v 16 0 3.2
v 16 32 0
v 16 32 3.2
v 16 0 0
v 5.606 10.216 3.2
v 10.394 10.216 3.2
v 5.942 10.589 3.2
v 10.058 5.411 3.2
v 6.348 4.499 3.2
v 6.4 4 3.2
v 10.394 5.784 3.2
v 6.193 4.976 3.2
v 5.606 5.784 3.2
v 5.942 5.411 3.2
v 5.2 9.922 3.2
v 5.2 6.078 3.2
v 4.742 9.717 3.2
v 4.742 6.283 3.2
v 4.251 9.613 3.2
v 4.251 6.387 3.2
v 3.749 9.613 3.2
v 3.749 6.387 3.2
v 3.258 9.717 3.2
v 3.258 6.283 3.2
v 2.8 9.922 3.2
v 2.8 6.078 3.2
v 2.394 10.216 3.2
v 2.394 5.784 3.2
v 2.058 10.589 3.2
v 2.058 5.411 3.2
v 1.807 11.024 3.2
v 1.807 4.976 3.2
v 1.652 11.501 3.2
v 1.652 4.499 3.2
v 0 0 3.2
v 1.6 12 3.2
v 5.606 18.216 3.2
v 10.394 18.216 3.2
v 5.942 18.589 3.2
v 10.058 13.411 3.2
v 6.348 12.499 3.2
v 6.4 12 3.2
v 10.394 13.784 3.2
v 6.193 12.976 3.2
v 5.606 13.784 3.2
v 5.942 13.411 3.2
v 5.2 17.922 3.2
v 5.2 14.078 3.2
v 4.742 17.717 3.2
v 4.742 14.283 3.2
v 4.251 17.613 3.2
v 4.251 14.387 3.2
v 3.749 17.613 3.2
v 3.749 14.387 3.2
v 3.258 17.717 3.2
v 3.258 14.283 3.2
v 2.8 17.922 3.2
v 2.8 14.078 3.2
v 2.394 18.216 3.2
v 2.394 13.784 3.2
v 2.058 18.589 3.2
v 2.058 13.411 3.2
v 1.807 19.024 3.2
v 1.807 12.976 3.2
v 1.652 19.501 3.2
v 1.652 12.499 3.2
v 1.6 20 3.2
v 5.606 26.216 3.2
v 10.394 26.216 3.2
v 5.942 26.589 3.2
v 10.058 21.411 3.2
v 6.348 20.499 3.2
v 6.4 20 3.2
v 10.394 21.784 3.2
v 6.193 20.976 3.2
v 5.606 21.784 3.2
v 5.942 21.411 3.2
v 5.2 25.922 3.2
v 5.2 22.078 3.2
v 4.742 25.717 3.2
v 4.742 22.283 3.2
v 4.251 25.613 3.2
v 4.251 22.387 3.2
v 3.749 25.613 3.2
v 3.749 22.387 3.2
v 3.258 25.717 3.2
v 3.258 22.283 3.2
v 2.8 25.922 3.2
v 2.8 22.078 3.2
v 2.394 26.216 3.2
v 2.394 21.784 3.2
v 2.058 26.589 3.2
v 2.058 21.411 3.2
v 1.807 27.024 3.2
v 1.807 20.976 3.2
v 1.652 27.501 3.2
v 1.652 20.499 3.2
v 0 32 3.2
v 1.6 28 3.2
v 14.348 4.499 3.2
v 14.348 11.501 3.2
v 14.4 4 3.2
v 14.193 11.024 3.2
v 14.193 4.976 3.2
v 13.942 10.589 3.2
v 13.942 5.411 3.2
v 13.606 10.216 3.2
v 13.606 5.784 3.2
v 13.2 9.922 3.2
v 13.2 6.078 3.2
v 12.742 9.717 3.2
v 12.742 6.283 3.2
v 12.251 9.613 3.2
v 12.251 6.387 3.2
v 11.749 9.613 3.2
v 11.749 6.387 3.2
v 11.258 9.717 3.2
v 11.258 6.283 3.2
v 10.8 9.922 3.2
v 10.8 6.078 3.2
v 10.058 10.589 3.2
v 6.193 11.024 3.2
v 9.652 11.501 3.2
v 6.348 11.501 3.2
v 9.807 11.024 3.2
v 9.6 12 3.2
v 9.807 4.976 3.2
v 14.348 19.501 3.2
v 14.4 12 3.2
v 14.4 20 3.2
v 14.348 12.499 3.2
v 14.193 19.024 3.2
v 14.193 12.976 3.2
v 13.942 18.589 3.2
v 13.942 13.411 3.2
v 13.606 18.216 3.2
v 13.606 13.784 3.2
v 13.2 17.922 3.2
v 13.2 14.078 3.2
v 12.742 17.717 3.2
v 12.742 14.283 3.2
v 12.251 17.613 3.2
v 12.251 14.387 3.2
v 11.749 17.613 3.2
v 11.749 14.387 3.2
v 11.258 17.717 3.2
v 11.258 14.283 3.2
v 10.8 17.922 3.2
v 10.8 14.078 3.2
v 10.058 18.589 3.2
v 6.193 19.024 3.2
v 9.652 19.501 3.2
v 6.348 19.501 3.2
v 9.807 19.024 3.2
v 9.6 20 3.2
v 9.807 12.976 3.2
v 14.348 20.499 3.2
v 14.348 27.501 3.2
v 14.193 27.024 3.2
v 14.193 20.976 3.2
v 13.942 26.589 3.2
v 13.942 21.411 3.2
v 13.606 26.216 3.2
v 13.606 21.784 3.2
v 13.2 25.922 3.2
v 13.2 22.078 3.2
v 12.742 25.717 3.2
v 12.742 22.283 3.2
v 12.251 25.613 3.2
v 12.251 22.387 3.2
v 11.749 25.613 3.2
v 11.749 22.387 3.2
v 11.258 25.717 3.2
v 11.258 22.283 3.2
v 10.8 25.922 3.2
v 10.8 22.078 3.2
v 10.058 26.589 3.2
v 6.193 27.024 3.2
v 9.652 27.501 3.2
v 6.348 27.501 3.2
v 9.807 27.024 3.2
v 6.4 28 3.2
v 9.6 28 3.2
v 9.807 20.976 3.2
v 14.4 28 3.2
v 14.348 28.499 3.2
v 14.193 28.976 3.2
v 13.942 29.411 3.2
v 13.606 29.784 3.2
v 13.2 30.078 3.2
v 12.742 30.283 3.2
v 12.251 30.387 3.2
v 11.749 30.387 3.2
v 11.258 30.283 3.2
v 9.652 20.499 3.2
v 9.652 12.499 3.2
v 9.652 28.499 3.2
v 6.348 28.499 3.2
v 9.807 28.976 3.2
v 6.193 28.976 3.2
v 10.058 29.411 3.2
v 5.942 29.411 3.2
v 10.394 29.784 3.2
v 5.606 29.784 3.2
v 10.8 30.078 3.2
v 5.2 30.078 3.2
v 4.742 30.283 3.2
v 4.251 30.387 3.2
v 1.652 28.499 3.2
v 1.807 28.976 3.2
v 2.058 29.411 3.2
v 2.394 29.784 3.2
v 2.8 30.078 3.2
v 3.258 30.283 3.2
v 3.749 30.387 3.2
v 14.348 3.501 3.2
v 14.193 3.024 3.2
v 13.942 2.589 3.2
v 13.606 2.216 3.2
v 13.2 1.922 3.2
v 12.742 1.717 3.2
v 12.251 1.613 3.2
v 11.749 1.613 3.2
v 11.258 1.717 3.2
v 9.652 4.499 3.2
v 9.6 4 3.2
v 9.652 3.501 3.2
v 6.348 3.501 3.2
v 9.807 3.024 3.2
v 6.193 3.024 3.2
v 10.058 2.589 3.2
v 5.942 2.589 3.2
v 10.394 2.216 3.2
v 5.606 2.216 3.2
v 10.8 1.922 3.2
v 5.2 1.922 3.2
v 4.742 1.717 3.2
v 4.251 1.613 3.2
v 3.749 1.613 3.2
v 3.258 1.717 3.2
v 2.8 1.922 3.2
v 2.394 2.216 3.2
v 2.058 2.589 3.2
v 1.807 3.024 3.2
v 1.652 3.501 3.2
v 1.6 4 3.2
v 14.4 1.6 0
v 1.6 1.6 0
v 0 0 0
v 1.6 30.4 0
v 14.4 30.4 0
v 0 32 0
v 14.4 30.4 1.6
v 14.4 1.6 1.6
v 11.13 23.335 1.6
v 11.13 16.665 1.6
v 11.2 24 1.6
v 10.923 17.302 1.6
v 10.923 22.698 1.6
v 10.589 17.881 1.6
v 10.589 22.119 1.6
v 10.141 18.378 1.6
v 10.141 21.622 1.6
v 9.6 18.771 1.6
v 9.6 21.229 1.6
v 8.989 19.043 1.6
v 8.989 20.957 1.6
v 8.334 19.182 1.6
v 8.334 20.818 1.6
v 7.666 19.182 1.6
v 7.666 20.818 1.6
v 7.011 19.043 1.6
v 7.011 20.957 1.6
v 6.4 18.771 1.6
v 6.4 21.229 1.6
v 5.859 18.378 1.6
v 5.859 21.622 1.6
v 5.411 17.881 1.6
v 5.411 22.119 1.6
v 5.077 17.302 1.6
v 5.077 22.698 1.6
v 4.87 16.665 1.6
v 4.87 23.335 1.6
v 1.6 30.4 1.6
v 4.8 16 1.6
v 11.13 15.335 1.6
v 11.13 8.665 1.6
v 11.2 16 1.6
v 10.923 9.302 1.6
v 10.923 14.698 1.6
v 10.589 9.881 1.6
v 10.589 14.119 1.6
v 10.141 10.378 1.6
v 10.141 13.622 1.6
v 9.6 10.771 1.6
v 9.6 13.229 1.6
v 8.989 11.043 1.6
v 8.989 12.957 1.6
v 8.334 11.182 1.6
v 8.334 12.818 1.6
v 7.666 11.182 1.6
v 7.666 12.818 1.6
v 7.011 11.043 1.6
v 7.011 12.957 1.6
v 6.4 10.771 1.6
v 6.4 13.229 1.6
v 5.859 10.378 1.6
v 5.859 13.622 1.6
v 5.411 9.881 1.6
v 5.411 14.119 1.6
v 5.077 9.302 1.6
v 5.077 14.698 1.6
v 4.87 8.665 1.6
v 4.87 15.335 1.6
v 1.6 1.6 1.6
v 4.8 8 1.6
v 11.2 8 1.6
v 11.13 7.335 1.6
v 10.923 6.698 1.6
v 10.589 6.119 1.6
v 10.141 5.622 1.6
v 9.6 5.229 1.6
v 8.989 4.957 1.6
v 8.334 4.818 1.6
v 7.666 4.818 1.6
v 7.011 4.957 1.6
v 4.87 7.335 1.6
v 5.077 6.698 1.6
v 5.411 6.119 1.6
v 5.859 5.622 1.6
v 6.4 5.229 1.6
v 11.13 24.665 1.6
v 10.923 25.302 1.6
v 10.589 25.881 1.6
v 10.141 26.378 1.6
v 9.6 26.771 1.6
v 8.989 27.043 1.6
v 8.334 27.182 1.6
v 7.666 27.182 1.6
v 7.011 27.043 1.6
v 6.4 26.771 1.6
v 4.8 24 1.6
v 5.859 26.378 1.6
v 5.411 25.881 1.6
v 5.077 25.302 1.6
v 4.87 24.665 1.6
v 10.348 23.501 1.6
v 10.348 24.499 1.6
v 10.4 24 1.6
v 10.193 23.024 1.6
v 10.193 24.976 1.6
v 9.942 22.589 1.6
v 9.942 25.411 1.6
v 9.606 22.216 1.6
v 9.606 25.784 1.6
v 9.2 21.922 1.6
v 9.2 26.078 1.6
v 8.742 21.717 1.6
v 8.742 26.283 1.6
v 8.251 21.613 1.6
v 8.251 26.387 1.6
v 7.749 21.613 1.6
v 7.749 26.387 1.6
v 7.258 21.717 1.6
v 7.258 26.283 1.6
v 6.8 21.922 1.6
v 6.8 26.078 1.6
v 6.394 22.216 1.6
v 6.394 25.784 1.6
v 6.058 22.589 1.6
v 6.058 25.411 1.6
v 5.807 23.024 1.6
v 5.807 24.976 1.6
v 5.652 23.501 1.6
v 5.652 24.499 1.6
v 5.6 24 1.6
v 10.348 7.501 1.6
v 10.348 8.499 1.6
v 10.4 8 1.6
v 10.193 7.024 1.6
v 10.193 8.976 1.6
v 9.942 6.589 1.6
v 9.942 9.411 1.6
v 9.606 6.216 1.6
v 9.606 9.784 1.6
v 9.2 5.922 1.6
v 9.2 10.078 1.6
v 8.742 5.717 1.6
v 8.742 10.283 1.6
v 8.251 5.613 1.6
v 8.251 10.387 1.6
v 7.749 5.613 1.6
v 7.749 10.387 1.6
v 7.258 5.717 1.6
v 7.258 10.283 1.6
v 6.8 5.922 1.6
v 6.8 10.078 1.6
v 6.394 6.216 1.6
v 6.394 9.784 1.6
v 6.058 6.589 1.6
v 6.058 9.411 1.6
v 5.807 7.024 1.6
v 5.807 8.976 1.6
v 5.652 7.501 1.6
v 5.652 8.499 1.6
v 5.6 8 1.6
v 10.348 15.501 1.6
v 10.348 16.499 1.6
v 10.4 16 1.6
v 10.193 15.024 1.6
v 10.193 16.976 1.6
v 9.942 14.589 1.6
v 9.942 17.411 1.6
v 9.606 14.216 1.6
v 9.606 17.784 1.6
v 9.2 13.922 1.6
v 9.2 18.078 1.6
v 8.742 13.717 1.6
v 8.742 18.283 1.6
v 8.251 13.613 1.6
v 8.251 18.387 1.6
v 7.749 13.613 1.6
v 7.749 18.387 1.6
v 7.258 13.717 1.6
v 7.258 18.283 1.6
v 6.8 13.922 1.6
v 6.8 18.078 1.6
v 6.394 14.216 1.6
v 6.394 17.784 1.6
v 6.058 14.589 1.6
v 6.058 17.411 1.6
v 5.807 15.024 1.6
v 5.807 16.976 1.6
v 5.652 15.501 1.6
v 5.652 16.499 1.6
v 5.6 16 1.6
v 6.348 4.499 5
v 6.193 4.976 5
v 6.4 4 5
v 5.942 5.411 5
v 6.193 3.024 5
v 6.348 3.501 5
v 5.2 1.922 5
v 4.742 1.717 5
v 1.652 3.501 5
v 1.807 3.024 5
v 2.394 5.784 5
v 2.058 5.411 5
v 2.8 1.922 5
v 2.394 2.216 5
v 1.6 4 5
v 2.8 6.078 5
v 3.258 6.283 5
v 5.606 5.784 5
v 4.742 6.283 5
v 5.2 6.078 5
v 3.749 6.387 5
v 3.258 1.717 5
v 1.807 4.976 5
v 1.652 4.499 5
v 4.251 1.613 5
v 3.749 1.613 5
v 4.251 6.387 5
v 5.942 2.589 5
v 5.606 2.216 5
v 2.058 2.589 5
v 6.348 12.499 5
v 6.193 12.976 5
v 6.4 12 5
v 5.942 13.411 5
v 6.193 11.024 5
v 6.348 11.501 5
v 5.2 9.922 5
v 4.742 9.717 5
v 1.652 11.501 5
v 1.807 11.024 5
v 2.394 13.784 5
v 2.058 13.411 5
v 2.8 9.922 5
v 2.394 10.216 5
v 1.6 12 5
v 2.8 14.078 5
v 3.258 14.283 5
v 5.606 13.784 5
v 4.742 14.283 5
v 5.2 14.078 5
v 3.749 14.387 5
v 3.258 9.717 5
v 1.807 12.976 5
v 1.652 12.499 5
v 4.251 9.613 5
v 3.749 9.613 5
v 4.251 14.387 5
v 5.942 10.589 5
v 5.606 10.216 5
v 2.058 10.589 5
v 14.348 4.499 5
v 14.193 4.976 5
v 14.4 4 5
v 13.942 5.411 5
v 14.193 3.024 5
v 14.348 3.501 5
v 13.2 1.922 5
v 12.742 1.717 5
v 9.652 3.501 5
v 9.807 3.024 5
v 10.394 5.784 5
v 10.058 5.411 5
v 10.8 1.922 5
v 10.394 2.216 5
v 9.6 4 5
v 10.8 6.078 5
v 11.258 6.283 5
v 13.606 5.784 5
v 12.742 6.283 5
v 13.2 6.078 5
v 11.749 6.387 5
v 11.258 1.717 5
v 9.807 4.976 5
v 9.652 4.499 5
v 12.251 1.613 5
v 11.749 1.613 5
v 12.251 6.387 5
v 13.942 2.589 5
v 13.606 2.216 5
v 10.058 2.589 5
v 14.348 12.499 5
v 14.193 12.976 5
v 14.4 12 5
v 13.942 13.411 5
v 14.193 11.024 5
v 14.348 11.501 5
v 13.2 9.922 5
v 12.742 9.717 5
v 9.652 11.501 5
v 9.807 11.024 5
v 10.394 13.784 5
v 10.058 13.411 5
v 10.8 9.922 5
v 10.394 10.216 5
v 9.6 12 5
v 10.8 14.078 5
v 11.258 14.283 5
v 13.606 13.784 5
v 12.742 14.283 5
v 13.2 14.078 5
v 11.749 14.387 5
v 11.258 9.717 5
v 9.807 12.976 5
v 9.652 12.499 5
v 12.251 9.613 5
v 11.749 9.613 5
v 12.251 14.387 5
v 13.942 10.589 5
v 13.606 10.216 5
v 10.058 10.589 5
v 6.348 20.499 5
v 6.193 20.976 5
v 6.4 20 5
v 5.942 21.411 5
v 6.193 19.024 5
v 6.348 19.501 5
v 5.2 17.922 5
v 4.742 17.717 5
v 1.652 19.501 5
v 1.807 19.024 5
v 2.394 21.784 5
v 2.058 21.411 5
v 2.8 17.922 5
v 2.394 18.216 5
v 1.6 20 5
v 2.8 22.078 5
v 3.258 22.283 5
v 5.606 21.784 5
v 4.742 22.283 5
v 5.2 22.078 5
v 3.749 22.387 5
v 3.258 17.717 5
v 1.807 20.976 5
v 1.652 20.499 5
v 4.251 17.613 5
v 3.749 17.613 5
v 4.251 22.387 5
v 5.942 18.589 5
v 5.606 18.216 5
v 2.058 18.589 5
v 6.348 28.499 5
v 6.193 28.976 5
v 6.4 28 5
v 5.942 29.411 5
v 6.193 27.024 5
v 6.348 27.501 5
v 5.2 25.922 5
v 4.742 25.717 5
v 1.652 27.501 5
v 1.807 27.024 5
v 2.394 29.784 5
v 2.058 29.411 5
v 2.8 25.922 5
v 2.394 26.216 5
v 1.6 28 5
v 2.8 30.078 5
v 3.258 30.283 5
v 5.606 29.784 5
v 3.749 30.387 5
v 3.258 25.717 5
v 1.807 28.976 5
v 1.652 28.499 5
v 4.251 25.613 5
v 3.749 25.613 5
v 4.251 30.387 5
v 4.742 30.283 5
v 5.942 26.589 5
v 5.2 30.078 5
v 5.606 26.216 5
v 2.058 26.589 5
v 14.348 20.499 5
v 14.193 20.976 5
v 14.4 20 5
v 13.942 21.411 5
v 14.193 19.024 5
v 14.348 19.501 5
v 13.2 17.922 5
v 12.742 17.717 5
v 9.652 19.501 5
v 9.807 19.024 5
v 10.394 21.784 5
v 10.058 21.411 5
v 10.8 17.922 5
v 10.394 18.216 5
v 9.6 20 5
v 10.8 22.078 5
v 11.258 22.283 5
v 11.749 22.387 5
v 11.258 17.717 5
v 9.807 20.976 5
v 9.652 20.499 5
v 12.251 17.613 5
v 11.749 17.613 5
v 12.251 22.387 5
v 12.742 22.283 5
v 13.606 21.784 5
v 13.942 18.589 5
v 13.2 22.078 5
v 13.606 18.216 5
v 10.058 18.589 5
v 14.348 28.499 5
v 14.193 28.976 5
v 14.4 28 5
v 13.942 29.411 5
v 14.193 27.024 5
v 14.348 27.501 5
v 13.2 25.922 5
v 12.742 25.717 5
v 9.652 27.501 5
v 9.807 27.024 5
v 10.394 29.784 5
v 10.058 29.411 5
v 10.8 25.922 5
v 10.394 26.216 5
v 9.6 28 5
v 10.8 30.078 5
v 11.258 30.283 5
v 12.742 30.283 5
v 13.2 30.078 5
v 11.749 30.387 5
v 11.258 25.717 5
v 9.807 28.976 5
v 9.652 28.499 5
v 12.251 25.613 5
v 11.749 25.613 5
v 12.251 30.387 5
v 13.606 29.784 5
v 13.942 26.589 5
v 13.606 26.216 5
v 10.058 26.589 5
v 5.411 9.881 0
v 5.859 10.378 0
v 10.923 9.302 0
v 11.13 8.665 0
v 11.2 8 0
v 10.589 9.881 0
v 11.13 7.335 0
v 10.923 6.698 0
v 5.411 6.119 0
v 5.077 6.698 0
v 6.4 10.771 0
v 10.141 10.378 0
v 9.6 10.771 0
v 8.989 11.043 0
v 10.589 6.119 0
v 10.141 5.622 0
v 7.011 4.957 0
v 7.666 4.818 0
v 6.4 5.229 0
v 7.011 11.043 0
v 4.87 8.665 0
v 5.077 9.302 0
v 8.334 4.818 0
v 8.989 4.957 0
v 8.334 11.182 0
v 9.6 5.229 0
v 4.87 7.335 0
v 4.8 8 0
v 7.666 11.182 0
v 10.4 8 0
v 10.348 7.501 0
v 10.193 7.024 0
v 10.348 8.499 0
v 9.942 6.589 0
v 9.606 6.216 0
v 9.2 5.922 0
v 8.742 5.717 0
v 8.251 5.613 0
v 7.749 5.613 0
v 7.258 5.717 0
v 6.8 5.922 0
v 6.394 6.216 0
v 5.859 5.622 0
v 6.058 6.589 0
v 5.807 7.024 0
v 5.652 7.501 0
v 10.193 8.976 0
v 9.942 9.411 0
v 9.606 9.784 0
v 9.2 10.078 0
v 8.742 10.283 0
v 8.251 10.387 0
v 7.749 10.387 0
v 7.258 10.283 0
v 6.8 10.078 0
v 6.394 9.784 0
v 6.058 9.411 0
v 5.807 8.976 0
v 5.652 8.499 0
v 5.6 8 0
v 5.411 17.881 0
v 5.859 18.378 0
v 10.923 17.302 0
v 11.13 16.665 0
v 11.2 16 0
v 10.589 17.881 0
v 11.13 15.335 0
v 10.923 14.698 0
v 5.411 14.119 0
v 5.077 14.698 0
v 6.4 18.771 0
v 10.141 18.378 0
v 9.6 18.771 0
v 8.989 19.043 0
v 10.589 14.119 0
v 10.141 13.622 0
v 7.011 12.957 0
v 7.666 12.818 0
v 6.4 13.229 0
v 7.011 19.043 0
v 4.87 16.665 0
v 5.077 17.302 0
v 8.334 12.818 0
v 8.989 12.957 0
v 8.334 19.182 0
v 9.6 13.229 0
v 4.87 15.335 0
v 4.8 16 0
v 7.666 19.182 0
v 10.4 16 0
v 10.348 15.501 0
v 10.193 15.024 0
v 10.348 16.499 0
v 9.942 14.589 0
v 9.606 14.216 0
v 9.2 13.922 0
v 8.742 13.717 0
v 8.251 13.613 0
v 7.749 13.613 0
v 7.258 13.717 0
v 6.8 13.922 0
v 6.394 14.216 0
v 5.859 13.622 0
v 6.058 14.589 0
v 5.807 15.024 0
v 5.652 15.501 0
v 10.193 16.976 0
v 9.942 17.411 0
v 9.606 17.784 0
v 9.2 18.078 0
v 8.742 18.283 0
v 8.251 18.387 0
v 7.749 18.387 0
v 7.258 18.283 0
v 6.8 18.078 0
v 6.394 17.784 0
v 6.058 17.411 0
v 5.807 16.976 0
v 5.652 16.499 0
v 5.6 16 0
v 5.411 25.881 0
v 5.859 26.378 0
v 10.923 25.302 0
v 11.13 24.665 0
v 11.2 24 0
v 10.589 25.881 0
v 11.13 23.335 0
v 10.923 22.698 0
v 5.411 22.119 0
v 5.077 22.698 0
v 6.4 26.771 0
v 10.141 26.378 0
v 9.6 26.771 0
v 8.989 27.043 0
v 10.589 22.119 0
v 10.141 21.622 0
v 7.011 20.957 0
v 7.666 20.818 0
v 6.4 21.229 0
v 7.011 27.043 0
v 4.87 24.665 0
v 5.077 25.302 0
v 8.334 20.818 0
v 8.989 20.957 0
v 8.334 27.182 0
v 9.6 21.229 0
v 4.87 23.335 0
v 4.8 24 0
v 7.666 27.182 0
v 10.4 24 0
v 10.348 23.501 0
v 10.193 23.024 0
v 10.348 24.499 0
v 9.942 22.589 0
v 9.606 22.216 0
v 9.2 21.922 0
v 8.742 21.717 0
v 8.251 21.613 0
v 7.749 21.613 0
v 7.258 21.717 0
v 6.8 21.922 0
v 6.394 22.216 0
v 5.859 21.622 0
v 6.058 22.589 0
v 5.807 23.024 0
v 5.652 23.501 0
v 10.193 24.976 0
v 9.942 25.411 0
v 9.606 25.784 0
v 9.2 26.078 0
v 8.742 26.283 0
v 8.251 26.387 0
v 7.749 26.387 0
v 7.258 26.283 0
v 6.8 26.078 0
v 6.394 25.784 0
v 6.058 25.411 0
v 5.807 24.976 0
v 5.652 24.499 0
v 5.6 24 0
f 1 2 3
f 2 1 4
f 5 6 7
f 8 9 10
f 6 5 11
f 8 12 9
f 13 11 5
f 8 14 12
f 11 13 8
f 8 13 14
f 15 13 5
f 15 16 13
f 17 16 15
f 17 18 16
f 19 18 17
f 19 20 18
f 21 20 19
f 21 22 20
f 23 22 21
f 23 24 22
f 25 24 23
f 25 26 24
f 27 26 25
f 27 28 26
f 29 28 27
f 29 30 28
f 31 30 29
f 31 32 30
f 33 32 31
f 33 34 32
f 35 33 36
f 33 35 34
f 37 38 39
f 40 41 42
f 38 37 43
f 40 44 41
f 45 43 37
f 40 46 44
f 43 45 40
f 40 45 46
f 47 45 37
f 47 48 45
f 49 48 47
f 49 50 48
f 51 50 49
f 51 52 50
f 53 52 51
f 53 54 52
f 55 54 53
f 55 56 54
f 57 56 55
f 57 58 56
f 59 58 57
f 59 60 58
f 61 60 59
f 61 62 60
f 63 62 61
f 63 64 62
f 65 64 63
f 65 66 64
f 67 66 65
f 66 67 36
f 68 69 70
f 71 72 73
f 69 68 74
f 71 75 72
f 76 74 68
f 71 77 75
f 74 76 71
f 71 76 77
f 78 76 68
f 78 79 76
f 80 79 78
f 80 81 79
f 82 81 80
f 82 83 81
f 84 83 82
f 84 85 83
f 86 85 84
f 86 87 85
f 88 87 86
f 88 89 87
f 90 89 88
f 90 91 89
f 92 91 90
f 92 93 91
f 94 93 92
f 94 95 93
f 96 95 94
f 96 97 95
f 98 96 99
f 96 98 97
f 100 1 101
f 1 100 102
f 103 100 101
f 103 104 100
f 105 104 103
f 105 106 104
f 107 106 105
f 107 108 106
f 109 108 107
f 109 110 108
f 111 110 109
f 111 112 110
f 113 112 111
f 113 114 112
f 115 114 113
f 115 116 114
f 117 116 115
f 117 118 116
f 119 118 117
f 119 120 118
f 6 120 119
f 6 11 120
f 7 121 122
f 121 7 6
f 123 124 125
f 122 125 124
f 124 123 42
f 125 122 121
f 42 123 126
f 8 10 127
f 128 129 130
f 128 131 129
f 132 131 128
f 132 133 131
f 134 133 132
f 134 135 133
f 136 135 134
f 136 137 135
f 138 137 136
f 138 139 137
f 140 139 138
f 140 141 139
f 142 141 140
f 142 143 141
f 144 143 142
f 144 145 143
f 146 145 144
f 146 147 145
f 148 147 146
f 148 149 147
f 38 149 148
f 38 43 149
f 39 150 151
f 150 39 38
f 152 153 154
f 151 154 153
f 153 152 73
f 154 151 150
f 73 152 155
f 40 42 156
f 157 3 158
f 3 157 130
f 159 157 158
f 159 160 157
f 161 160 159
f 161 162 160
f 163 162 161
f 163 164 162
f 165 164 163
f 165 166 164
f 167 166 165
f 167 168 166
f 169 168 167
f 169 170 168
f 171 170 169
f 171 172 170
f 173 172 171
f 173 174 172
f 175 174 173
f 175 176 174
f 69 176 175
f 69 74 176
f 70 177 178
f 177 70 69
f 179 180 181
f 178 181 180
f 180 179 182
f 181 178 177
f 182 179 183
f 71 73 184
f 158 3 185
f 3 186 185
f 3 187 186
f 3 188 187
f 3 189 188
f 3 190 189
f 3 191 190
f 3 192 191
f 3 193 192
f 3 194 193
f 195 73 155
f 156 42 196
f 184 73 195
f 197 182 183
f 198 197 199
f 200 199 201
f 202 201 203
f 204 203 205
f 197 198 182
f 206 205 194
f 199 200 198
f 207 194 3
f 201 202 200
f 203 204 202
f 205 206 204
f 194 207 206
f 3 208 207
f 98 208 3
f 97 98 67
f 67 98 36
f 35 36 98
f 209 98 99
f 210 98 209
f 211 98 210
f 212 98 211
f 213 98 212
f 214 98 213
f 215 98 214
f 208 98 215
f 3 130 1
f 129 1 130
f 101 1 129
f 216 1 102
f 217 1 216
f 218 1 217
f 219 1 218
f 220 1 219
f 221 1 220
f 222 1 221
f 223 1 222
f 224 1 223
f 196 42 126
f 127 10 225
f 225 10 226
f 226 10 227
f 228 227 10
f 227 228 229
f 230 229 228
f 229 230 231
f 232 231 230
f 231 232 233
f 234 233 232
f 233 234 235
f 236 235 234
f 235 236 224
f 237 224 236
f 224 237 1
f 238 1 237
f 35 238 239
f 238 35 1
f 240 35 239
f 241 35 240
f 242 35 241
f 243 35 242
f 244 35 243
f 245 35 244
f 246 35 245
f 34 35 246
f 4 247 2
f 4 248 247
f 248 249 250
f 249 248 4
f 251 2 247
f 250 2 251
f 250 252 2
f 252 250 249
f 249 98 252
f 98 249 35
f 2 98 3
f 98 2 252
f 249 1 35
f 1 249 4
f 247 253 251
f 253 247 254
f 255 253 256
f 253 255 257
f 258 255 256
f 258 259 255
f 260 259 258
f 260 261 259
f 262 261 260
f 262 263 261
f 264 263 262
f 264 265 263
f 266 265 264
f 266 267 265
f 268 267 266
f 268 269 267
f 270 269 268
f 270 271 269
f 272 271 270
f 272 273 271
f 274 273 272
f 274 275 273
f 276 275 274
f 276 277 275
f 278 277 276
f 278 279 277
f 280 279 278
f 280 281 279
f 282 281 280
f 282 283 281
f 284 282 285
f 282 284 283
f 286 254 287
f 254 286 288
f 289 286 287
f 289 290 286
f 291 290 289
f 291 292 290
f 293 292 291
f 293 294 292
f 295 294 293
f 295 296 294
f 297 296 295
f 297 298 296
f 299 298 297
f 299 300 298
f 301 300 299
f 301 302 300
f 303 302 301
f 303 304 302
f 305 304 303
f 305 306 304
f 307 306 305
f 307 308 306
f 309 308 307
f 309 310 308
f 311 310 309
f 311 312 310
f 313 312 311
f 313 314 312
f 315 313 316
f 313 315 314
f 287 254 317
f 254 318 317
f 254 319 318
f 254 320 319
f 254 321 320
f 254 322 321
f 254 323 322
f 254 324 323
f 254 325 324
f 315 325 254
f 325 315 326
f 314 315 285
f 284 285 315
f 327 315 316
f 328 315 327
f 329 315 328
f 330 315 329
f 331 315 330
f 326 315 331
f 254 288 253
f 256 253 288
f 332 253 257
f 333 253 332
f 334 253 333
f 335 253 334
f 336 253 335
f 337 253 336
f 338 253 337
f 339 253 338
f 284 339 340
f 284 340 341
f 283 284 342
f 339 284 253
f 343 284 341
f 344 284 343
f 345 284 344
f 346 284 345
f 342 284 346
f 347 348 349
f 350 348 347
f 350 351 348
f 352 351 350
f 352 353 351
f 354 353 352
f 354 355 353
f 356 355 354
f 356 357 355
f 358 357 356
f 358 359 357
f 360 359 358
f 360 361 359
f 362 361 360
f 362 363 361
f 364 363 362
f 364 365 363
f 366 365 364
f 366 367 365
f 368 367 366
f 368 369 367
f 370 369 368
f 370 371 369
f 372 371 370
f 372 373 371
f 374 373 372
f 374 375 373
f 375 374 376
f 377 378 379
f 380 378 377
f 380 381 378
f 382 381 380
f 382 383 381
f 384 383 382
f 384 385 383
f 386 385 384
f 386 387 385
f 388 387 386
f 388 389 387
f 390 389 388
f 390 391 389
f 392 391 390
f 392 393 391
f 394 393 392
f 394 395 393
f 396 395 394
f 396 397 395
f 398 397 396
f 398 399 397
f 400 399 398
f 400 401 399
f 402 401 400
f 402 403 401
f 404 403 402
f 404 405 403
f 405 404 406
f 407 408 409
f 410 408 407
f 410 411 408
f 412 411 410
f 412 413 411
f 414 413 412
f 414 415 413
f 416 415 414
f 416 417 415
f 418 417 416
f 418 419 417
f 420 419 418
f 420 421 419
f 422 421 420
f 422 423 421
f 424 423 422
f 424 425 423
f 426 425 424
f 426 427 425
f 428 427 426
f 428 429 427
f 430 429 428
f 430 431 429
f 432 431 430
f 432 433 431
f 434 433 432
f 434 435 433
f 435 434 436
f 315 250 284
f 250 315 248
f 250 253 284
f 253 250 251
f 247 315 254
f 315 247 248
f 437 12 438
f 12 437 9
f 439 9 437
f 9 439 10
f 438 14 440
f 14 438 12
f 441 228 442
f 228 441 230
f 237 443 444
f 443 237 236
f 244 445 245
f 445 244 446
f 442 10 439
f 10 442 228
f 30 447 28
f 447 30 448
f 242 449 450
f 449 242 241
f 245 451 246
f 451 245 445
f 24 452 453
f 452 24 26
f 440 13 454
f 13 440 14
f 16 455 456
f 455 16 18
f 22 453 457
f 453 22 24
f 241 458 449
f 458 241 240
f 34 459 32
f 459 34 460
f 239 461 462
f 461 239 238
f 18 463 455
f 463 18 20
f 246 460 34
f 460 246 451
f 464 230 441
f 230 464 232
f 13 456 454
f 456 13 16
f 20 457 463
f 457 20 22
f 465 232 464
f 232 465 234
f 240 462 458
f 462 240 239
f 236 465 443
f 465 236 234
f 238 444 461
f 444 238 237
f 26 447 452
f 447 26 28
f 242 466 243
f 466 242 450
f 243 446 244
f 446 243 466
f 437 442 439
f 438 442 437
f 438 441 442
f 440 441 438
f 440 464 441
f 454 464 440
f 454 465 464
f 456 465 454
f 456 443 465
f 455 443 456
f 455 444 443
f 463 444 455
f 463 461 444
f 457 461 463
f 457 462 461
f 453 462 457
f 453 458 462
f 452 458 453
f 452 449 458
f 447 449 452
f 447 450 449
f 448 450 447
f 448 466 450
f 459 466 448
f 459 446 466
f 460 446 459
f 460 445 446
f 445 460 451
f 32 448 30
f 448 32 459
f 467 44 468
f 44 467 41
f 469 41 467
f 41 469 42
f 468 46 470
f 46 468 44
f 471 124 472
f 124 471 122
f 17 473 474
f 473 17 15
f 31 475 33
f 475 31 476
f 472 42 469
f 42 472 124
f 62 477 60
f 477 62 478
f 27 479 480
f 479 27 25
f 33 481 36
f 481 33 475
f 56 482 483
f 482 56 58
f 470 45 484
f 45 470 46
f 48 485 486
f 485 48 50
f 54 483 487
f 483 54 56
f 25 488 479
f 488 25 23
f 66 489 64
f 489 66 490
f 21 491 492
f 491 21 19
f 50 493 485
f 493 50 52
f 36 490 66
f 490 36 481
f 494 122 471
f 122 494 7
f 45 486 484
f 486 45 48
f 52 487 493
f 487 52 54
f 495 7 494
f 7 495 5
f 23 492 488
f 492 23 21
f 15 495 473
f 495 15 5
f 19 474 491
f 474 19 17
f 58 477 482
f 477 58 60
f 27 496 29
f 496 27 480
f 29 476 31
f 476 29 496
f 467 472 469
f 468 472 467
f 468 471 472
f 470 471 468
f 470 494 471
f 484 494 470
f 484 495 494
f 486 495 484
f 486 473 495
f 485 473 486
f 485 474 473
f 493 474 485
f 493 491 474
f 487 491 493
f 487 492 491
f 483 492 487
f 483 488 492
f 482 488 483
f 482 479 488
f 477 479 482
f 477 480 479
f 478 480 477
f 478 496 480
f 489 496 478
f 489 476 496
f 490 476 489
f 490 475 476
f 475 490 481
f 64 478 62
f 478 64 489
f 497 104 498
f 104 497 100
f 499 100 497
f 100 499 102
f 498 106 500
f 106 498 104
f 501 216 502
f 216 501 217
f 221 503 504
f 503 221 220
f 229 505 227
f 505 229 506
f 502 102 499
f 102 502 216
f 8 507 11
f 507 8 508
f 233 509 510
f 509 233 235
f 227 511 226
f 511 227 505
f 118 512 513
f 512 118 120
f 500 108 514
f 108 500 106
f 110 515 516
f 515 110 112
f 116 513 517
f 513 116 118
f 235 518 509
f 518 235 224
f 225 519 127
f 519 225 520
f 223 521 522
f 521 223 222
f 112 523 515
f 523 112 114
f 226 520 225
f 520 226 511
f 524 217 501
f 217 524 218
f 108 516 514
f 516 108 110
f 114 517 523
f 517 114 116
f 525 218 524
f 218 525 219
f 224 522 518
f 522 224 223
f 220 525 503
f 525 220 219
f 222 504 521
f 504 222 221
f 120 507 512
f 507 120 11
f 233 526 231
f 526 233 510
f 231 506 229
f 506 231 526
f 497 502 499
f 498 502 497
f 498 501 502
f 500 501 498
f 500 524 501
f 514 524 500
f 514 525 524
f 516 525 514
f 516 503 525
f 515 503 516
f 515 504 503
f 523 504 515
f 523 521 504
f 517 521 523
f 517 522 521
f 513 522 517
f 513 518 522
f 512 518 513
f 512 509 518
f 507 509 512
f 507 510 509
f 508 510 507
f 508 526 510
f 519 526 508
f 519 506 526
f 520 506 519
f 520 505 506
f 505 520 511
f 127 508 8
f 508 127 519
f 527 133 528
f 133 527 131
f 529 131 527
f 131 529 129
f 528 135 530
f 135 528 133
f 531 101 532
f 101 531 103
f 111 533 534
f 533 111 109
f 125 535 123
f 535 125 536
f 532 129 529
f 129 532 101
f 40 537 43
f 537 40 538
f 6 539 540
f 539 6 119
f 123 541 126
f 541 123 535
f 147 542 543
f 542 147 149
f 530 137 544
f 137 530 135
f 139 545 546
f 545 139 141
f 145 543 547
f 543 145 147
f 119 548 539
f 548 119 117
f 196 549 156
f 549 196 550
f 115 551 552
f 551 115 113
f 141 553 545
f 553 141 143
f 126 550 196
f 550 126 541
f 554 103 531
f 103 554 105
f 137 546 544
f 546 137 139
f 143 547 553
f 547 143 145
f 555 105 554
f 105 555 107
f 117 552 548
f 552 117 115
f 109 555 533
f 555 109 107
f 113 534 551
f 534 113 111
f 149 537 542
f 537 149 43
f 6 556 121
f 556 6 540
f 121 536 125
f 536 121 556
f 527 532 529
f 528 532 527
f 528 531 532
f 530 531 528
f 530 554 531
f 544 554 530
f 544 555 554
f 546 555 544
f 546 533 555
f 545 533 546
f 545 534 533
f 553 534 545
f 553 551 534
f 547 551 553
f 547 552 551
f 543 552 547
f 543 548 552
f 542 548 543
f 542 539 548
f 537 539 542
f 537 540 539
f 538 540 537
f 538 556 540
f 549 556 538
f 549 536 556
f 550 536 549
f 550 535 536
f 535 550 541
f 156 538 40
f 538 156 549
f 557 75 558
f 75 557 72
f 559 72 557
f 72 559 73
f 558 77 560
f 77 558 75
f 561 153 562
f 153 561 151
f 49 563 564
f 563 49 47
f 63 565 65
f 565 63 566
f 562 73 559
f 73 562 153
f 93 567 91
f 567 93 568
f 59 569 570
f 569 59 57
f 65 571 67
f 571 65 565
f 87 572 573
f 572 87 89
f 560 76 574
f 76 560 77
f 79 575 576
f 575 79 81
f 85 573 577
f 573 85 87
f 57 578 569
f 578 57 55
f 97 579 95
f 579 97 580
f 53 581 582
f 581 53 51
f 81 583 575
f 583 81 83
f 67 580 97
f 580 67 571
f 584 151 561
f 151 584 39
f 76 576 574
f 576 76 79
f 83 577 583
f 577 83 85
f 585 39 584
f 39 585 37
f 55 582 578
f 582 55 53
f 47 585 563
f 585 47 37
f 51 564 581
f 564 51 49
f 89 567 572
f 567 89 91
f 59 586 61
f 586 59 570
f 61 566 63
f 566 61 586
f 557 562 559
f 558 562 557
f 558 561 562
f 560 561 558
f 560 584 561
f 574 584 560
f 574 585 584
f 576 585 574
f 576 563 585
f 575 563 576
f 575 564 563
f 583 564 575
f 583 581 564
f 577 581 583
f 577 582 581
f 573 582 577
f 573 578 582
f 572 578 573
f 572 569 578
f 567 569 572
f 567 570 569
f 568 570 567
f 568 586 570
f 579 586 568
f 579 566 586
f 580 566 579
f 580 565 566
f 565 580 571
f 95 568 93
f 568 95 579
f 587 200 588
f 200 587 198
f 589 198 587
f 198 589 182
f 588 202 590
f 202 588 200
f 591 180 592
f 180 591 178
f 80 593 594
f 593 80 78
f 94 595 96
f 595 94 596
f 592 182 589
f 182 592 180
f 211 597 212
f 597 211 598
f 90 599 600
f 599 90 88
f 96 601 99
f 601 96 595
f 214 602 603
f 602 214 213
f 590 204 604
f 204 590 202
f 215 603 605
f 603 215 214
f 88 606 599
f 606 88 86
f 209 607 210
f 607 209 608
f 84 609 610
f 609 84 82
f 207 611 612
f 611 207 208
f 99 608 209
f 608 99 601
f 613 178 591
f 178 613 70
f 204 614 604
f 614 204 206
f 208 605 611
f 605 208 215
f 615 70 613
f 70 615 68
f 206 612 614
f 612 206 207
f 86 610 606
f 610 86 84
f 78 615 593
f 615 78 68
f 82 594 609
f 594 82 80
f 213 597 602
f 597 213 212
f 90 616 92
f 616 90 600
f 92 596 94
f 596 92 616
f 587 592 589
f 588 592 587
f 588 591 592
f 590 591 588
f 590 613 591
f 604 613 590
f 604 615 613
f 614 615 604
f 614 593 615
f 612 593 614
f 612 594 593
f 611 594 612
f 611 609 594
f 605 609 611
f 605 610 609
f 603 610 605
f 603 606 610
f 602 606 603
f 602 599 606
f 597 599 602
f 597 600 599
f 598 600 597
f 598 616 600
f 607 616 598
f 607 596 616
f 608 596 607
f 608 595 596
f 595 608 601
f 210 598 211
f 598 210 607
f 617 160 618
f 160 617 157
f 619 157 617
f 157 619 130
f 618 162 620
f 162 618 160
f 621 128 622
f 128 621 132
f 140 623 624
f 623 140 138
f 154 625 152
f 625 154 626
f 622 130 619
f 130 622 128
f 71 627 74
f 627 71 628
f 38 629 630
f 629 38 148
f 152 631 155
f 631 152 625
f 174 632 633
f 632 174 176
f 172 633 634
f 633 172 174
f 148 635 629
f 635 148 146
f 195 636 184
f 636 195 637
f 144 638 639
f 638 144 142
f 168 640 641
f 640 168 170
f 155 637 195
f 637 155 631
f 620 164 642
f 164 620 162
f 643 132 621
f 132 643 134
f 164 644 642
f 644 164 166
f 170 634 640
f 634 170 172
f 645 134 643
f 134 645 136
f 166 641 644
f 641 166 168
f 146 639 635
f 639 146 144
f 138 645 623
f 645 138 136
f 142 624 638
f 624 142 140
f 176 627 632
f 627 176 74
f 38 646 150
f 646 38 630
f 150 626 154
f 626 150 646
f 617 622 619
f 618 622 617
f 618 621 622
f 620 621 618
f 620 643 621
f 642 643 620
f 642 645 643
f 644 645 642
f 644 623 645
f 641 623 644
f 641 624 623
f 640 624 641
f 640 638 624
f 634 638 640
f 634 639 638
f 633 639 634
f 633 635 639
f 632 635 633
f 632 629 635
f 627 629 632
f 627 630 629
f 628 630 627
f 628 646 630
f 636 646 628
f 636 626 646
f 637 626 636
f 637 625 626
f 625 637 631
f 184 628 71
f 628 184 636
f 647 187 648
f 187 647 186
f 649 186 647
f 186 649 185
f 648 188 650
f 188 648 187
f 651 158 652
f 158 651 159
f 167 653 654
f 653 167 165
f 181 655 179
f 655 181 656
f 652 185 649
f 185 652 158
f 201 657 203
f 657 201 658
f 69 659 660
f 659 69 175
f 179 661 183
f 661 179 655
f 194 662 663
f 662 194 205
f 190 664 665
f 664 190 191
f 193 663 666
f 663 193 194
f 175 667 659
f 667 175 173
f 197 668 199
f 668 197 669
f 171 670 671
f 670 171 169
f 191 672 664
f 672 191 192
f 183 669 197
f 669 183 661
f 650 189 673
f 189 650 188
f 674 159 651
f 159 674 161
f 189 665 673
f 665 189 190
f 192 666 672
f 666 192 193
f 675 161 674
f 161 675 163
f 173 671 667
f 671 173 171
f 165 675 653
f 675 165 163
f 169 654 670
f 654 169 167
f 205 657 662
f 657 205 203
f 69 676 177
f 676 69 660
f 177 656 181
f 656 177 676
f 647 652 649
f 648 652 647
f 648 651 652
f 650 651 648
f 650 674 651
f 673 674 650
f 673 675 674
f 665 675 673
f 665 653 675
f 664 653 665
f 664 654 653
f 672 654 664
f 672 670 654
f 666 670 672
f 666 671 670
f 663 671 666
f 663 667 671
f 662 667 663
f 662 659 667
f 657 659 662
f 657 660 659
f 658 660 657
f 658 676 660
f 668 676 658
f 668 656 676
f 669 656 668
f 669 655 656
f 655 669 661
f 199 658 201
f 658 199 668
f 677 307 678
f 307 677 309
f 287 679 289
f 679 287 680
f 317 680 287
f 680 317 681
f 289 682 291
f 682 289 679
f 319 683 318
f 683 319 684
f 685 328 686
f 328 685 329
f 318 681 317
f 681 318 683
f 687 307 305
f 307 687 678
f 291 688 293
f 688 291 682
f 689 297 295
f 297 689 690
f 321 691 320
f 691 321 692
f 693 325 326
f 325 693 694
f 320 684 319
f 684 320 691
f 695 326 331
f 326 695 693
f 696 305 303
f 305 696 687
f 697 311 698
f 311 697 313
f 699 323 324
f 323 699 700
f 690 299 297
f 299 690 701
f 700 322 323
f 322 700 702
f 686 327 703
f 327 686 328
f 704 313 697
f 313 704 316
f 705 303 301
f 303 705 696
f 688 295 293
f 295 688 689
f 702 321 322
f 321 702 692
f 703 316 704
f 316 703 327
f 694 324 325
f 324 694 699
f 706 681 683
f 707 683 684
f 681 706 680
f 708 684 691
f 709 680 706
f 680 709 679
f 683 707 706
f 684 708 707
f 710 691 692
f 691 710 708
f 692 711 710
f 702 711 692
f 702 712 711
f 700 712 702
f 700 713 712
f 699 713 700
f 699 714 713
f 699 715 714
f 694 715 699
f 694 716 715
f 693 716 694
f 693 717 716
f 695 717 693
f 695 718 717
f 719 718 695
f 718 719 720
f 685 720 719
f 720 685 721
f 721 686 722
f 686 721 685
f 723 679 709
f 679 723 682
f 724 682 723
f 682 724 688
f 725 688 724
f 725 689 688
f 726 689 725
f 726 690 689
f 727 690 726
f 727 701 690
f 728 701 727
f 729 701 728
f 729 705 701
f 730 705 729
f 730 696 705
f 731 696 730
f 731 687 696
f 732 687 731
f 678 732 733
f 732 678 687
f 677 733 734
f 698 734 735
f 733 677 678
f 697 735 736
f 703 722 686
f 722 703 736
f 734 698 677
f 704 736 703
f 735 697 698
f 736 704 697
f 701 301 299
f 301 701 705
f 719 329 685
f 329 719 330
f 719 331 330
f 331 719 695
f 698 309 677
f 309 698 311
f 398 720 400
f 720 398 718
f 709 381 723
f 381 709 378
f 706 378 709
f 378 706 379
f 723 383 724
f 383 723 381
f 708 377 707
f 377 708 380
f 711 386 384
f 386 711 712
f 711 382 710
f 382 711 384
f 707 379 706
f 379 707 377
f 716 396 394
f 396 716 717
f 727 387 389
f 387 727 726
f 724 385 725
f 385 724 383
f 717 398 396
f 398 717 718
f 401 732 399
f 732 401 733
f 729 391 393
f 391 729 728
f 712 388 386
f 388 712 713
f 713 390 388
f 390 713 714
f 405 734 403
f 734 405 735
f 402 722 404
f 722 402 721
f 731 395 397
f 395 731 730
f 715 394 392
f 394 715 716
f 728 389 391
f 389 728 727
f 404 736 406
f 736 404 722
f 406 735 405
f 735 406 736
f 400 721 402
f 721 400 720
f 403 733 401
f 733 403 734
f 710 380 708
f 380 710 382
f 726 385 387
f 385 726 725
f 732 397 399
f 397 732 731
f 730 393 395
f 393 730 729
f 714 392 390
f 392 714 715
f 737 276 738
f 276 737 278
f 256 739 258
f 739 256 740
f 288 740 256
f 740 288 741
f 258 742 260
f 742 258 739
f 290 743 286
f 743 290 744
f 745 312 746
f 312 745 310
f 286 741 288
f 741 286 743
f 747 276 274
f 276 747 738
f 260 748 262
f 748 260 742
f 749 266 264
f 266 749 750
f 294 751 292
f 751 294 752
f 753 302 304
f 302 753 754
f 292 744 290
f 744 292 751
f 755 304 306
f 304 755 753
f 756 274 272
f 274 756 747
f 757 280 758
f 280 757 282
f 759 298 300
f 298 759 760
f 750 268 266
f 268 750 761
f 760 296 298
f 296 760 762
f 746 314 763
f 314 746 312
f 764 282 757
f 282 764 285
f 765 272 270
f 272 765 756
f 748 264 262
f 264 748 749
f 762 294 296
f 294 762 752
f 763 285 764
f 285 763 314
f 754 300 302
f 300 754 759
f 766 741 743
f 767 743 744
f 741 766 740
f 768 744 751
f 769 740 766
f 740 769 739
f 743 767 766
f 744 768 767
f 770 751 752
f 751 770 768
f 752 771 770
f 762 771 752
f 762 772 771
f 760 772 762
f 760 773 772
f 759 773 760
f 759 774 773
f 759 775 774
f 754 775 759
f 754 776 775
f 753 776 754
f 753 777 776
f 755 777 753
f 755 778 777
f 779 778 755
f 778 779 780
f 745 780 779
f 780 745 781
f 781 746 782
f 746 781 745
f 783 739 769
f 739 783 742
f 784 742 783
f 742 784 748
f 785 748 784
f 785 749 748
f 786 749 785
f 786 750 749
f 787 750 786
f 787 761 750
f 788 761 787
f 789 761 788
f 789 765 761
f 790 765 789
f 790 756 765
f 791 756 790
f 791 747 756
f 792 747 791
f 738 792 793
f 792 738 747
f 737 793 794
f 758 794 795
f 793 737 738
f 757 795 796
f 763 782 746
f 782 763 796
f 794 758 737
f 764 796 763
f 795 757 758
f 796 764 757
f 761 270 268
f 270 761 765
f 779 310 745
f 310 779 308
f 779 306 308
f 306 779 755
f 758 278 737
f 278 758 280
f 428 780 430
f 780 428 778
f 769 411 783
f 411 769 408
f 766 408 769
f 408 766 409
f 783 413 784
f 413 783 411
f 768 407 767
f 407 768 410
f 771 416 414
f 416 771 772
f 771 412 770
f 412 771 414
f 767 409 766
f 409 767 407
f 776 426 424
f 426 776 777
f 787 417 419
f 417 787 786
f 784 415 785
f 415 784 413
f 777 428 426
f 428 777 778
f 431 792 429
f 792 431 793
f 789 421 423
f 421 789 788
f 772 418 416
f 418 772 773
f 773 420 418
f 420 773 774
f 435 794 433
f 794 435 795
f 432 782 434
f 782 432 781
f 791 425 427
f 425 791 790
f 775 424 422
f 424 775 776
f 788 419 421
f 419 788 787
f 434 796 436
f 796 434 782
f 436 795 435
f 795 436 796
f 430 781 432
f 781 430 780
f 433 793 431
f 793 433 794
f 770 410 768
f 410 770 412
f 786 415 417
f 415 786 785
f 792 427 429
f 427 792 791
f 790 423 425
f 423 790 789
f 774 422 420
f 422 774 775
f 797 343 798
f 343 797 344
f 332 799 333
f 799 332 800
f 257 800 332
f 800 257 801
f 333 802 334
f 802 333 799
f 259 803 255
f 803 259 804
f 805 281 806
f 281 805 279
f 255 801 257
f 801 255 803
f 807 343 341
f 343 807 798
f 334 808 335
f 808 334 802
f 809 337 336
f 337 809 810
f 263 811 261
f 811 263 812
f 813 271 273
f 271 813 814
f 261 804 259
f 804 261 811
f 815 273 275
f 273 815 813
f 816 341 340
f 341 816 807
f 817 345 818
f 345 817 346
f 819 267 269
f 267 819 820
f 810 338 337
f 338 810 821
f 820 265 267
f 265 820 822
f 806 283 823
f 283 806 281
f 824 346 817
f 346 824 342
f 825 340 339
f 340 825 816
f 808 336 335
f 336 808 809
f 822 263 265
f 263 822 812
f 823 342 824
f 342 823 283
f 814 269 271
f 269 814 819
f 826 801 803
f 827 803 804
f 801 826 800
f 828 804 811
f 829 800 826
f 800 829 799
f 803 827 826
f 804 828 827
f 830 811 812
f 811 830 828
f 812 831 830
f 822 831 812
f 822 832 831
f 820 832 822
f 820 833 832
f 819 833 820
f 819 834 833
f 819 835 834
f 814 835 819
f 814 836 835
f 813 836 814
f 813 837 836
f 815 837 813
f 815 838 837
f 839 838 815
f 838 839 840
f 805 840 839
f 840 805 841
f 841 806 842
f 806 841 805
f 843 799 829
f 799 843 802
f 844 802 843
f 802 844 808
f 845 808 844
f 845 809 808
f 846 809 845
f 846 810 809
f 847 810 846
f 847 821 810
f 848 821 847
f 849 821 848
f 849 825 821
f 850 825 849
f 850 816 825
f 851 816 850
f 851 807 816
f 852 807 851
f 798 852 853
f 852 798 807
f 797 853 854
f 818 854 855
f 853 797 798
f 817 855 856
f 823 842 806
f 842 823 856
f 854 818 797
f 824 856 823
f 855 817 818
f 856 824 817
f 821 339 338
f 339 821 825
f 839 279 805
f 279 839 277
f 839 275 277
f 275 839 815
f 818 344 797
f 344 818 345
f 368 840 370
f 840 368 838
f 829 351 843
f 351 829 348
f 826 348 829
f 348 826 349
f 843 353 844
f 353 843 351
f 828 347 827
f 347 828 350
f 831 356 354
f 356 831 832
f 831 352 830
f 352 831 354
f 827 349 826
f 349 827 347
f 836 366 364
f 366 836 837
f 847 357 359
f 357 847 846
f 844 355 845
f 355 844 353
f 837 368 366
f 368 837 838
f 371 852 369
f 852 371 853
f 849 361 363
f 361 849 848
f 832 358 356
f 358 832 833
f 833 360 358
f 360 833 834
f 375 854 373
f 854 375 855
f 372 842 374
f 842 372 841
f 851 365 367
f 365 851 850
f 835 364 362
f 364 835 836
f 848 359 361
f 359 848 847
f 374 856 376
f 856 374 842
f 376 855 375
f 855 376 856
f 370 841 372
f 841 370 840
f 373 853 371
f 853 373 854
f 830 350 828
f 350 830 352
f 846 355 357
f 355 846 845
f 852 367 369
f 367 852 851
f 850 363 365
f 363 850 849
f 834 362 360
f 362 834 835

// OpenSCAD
// Quick-and-dirty parametric LEGO-compatible
// bricks in OpenSCAD.
// LEGO(R) is a trademark of the LEGO Group.
// References:
// * http://www.robertcailliau.eu/Lego/Dimensions/zMeasurements-en.xhtml
// * http://nicjasno.com/forum/viewtopic.php?t=653

// Create (w*2,h*2) LEGO-compatible blocks.
two_by_two(1,2);

module two_by_two(w,l){
  // size constants
  DETAIL_SCALE=0.1; // all measurements below are in units of "0.1mm"
  WALL_THICKNESS=16; // 1.6mm thick walls - obviates need for tiny inner wall towers
  SQUARE_WIDTH=80; // 8mm
  SQUARE_HEIGHT=96; // 9.6mm - std. LEGO height
  PLATE_HEIGHT=32; // 3.2mm - std. flat plate height
  PEG_RADIUS=24; // 2.4mm
  PEG_HEIGHT=18; // 1.8mm
  ANTI_PEG_RADIUS=32; // 3.2mm

  my_height = PLATE_HEIGHT; // PLATE_HEIGHT or SQUARE_HEIGHT. DECIDE!

  scale(DETAIL_SCALE){
    // main outer rectangle shell
    difference(){
      cube([w*(SQUARE_WIDTH*2),l*(SQUARE_WIDTH*2),my_height]);
      translate([WALL_THICKNESS,WALL_THICKNESS,-WALL_THICKNESS]){
        cube([w*(2*SQUARE_WIDTH) - (2*WALL_THICKNESS), l*(2*SQUARE_WIDTH) - (2*WALL_THICKNESS), my_height]);
      }
    }

    // create 2x2 peg grid for each block "wide"x"long"
    for(i=[0:w-1]){ // for each 2x block wide
      for(j=[0:l-1]){ // for each 2x block long
        for(x=[SQUARE_WIDTH*0.5,SQUARE_WIDTH*1.5]) {
          for(y=[SQUARE_WIDTH*0.5, SQUARE_WIDTH*1.5]) {
            translate([(i * SQUARE_WIDTH * 2) + x, (j * SQUARE_WIDTH * 2) + y,my_height]){
            //  difference(){
                cylinder(h=PEG_HEIGHT, r=PEG_RADIUS);
			//	 cylinder(h=PEG_HEIGHT+0.1, r=(PEG_RADIUS - WALL_THICKNESS/2));
            //  }
            }
          }
        }
      }
    }

    // create 1x1 anti-peg grid for each block ((wide-1)*2)x(long-1)*2))
    for(i=[0:(w-1)*2]){
      for(j=[0:(l-1)*2]){
        translate([SQUARE_WIDTH + (SQUARE_WIDTH * i), SQUARE_WIDTH + (SQUARE_WIDTH * j), 0]){
          difference(){
            cylinder(r=ANTI_PEG_RADIUS, h=my_height);
            translate([0,0,-1]){
              cylinder(r=(ANTI_PEG_RADIUS - (WALL_THICKNESS/2)), h=my_height+0.5);
            }
          }
        }
      }
    }
  }
}
